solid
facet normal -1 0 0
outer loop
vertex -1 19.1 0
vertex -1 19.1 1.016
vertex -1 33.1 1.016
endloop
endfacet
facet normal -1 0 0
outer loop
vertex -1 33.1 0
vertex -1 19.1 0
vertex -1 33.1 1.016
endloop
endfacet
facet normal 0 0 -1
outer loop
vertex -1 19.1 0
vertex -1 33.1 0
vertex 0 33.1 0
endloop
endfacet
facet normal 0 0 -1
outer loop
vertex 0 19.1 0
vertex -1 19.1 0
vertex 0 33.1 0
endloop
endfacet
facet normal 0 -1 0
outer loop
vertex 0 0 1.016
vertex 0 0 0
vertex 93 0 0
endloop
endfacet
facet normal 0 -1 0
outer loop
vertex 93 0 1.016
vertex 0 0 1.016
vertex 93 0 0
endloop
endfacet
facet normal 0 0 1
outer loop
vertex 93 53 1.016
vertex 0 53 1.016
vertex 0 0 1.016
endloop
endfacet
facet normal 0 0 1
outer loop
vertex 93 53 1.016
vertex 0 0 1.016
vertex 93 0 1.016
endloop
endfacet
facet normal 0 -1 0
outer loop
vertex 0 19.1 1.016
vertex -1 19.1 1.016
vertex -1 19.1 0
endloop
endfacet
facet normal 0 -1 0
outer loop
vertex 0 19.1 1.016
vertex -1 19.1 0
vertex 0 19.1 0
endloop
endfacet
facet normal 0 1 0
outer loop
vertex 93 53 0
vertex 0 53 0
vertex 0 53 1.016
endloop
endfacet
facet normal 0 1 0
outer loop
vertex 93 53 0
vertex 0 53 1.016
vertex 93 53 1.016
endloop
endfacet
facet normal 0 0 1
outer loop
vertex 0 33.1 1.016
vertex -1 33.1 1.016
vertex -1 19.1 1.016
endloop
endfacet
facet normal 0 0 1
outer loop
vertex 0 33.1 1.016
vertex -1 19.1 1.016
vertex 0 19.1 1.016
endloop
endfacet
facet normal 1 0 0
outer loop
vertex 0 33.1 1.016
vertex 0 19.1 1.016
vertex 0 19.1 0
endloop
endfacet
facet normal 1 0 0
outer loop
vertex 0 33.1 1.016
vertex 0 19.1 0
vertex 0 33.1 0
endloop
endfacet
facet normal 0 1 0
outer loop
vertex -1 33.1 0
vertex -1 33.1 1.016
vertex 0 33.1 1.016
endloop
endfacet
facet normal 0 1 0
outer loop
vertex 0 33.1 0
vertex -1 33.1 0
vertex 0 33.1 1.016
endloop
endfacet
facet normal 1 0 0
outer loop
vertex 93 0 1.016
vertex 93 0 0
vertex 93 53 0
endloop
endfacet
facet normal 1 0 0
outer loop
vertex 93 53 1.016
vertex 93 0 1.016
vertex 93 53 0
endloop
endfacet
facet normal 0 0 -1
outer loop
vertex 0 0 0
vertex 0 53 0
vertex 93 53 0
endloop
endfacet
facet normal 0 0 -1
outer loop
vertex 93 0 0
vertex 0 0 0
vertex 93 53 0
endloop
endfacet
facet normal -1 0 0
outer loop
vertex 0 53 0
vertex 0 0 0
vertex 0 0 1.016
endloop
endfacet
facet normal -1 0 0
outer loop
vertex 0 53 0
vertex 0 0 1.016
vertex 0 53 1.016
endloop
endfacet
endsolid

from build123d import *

# Parameters (mm, degrees)
SKETCH1_W           = 93
SKETCH1_H           = 53
BOSS_EXTRUDE1_DEPTH = 1.016
SKETCH2_W           = 1
SKETCH2_H           = 14
BOSS_EXTRUDE2_DEPTH = 1.016


with BuildPart() as part:
    # Sketch1 → Boss-Extrude1 (new body)
    with BuildSketch(Plane.XY):
        with Locations((46.5, 26.5)):
            Rectangle(SKETCH1_W, SKETCH1_H)
    extrude(amount=BOSS_EXTRUDE1_DEPTH)


with BuildPart() as body_2:
    # Sketch2 → Boss-Extrude2 (new body)
    with BuildSketch(Plane.XY.offset(1.016)):
        with Locations((-0.5, 26.1)):
            Rectangle(SKETCH2_W, SKETCH2_H)
    extrude(amount=-BOSS_EXTRUDE2_DEPTH)


solid = Compound([part.part, body_2.part])
